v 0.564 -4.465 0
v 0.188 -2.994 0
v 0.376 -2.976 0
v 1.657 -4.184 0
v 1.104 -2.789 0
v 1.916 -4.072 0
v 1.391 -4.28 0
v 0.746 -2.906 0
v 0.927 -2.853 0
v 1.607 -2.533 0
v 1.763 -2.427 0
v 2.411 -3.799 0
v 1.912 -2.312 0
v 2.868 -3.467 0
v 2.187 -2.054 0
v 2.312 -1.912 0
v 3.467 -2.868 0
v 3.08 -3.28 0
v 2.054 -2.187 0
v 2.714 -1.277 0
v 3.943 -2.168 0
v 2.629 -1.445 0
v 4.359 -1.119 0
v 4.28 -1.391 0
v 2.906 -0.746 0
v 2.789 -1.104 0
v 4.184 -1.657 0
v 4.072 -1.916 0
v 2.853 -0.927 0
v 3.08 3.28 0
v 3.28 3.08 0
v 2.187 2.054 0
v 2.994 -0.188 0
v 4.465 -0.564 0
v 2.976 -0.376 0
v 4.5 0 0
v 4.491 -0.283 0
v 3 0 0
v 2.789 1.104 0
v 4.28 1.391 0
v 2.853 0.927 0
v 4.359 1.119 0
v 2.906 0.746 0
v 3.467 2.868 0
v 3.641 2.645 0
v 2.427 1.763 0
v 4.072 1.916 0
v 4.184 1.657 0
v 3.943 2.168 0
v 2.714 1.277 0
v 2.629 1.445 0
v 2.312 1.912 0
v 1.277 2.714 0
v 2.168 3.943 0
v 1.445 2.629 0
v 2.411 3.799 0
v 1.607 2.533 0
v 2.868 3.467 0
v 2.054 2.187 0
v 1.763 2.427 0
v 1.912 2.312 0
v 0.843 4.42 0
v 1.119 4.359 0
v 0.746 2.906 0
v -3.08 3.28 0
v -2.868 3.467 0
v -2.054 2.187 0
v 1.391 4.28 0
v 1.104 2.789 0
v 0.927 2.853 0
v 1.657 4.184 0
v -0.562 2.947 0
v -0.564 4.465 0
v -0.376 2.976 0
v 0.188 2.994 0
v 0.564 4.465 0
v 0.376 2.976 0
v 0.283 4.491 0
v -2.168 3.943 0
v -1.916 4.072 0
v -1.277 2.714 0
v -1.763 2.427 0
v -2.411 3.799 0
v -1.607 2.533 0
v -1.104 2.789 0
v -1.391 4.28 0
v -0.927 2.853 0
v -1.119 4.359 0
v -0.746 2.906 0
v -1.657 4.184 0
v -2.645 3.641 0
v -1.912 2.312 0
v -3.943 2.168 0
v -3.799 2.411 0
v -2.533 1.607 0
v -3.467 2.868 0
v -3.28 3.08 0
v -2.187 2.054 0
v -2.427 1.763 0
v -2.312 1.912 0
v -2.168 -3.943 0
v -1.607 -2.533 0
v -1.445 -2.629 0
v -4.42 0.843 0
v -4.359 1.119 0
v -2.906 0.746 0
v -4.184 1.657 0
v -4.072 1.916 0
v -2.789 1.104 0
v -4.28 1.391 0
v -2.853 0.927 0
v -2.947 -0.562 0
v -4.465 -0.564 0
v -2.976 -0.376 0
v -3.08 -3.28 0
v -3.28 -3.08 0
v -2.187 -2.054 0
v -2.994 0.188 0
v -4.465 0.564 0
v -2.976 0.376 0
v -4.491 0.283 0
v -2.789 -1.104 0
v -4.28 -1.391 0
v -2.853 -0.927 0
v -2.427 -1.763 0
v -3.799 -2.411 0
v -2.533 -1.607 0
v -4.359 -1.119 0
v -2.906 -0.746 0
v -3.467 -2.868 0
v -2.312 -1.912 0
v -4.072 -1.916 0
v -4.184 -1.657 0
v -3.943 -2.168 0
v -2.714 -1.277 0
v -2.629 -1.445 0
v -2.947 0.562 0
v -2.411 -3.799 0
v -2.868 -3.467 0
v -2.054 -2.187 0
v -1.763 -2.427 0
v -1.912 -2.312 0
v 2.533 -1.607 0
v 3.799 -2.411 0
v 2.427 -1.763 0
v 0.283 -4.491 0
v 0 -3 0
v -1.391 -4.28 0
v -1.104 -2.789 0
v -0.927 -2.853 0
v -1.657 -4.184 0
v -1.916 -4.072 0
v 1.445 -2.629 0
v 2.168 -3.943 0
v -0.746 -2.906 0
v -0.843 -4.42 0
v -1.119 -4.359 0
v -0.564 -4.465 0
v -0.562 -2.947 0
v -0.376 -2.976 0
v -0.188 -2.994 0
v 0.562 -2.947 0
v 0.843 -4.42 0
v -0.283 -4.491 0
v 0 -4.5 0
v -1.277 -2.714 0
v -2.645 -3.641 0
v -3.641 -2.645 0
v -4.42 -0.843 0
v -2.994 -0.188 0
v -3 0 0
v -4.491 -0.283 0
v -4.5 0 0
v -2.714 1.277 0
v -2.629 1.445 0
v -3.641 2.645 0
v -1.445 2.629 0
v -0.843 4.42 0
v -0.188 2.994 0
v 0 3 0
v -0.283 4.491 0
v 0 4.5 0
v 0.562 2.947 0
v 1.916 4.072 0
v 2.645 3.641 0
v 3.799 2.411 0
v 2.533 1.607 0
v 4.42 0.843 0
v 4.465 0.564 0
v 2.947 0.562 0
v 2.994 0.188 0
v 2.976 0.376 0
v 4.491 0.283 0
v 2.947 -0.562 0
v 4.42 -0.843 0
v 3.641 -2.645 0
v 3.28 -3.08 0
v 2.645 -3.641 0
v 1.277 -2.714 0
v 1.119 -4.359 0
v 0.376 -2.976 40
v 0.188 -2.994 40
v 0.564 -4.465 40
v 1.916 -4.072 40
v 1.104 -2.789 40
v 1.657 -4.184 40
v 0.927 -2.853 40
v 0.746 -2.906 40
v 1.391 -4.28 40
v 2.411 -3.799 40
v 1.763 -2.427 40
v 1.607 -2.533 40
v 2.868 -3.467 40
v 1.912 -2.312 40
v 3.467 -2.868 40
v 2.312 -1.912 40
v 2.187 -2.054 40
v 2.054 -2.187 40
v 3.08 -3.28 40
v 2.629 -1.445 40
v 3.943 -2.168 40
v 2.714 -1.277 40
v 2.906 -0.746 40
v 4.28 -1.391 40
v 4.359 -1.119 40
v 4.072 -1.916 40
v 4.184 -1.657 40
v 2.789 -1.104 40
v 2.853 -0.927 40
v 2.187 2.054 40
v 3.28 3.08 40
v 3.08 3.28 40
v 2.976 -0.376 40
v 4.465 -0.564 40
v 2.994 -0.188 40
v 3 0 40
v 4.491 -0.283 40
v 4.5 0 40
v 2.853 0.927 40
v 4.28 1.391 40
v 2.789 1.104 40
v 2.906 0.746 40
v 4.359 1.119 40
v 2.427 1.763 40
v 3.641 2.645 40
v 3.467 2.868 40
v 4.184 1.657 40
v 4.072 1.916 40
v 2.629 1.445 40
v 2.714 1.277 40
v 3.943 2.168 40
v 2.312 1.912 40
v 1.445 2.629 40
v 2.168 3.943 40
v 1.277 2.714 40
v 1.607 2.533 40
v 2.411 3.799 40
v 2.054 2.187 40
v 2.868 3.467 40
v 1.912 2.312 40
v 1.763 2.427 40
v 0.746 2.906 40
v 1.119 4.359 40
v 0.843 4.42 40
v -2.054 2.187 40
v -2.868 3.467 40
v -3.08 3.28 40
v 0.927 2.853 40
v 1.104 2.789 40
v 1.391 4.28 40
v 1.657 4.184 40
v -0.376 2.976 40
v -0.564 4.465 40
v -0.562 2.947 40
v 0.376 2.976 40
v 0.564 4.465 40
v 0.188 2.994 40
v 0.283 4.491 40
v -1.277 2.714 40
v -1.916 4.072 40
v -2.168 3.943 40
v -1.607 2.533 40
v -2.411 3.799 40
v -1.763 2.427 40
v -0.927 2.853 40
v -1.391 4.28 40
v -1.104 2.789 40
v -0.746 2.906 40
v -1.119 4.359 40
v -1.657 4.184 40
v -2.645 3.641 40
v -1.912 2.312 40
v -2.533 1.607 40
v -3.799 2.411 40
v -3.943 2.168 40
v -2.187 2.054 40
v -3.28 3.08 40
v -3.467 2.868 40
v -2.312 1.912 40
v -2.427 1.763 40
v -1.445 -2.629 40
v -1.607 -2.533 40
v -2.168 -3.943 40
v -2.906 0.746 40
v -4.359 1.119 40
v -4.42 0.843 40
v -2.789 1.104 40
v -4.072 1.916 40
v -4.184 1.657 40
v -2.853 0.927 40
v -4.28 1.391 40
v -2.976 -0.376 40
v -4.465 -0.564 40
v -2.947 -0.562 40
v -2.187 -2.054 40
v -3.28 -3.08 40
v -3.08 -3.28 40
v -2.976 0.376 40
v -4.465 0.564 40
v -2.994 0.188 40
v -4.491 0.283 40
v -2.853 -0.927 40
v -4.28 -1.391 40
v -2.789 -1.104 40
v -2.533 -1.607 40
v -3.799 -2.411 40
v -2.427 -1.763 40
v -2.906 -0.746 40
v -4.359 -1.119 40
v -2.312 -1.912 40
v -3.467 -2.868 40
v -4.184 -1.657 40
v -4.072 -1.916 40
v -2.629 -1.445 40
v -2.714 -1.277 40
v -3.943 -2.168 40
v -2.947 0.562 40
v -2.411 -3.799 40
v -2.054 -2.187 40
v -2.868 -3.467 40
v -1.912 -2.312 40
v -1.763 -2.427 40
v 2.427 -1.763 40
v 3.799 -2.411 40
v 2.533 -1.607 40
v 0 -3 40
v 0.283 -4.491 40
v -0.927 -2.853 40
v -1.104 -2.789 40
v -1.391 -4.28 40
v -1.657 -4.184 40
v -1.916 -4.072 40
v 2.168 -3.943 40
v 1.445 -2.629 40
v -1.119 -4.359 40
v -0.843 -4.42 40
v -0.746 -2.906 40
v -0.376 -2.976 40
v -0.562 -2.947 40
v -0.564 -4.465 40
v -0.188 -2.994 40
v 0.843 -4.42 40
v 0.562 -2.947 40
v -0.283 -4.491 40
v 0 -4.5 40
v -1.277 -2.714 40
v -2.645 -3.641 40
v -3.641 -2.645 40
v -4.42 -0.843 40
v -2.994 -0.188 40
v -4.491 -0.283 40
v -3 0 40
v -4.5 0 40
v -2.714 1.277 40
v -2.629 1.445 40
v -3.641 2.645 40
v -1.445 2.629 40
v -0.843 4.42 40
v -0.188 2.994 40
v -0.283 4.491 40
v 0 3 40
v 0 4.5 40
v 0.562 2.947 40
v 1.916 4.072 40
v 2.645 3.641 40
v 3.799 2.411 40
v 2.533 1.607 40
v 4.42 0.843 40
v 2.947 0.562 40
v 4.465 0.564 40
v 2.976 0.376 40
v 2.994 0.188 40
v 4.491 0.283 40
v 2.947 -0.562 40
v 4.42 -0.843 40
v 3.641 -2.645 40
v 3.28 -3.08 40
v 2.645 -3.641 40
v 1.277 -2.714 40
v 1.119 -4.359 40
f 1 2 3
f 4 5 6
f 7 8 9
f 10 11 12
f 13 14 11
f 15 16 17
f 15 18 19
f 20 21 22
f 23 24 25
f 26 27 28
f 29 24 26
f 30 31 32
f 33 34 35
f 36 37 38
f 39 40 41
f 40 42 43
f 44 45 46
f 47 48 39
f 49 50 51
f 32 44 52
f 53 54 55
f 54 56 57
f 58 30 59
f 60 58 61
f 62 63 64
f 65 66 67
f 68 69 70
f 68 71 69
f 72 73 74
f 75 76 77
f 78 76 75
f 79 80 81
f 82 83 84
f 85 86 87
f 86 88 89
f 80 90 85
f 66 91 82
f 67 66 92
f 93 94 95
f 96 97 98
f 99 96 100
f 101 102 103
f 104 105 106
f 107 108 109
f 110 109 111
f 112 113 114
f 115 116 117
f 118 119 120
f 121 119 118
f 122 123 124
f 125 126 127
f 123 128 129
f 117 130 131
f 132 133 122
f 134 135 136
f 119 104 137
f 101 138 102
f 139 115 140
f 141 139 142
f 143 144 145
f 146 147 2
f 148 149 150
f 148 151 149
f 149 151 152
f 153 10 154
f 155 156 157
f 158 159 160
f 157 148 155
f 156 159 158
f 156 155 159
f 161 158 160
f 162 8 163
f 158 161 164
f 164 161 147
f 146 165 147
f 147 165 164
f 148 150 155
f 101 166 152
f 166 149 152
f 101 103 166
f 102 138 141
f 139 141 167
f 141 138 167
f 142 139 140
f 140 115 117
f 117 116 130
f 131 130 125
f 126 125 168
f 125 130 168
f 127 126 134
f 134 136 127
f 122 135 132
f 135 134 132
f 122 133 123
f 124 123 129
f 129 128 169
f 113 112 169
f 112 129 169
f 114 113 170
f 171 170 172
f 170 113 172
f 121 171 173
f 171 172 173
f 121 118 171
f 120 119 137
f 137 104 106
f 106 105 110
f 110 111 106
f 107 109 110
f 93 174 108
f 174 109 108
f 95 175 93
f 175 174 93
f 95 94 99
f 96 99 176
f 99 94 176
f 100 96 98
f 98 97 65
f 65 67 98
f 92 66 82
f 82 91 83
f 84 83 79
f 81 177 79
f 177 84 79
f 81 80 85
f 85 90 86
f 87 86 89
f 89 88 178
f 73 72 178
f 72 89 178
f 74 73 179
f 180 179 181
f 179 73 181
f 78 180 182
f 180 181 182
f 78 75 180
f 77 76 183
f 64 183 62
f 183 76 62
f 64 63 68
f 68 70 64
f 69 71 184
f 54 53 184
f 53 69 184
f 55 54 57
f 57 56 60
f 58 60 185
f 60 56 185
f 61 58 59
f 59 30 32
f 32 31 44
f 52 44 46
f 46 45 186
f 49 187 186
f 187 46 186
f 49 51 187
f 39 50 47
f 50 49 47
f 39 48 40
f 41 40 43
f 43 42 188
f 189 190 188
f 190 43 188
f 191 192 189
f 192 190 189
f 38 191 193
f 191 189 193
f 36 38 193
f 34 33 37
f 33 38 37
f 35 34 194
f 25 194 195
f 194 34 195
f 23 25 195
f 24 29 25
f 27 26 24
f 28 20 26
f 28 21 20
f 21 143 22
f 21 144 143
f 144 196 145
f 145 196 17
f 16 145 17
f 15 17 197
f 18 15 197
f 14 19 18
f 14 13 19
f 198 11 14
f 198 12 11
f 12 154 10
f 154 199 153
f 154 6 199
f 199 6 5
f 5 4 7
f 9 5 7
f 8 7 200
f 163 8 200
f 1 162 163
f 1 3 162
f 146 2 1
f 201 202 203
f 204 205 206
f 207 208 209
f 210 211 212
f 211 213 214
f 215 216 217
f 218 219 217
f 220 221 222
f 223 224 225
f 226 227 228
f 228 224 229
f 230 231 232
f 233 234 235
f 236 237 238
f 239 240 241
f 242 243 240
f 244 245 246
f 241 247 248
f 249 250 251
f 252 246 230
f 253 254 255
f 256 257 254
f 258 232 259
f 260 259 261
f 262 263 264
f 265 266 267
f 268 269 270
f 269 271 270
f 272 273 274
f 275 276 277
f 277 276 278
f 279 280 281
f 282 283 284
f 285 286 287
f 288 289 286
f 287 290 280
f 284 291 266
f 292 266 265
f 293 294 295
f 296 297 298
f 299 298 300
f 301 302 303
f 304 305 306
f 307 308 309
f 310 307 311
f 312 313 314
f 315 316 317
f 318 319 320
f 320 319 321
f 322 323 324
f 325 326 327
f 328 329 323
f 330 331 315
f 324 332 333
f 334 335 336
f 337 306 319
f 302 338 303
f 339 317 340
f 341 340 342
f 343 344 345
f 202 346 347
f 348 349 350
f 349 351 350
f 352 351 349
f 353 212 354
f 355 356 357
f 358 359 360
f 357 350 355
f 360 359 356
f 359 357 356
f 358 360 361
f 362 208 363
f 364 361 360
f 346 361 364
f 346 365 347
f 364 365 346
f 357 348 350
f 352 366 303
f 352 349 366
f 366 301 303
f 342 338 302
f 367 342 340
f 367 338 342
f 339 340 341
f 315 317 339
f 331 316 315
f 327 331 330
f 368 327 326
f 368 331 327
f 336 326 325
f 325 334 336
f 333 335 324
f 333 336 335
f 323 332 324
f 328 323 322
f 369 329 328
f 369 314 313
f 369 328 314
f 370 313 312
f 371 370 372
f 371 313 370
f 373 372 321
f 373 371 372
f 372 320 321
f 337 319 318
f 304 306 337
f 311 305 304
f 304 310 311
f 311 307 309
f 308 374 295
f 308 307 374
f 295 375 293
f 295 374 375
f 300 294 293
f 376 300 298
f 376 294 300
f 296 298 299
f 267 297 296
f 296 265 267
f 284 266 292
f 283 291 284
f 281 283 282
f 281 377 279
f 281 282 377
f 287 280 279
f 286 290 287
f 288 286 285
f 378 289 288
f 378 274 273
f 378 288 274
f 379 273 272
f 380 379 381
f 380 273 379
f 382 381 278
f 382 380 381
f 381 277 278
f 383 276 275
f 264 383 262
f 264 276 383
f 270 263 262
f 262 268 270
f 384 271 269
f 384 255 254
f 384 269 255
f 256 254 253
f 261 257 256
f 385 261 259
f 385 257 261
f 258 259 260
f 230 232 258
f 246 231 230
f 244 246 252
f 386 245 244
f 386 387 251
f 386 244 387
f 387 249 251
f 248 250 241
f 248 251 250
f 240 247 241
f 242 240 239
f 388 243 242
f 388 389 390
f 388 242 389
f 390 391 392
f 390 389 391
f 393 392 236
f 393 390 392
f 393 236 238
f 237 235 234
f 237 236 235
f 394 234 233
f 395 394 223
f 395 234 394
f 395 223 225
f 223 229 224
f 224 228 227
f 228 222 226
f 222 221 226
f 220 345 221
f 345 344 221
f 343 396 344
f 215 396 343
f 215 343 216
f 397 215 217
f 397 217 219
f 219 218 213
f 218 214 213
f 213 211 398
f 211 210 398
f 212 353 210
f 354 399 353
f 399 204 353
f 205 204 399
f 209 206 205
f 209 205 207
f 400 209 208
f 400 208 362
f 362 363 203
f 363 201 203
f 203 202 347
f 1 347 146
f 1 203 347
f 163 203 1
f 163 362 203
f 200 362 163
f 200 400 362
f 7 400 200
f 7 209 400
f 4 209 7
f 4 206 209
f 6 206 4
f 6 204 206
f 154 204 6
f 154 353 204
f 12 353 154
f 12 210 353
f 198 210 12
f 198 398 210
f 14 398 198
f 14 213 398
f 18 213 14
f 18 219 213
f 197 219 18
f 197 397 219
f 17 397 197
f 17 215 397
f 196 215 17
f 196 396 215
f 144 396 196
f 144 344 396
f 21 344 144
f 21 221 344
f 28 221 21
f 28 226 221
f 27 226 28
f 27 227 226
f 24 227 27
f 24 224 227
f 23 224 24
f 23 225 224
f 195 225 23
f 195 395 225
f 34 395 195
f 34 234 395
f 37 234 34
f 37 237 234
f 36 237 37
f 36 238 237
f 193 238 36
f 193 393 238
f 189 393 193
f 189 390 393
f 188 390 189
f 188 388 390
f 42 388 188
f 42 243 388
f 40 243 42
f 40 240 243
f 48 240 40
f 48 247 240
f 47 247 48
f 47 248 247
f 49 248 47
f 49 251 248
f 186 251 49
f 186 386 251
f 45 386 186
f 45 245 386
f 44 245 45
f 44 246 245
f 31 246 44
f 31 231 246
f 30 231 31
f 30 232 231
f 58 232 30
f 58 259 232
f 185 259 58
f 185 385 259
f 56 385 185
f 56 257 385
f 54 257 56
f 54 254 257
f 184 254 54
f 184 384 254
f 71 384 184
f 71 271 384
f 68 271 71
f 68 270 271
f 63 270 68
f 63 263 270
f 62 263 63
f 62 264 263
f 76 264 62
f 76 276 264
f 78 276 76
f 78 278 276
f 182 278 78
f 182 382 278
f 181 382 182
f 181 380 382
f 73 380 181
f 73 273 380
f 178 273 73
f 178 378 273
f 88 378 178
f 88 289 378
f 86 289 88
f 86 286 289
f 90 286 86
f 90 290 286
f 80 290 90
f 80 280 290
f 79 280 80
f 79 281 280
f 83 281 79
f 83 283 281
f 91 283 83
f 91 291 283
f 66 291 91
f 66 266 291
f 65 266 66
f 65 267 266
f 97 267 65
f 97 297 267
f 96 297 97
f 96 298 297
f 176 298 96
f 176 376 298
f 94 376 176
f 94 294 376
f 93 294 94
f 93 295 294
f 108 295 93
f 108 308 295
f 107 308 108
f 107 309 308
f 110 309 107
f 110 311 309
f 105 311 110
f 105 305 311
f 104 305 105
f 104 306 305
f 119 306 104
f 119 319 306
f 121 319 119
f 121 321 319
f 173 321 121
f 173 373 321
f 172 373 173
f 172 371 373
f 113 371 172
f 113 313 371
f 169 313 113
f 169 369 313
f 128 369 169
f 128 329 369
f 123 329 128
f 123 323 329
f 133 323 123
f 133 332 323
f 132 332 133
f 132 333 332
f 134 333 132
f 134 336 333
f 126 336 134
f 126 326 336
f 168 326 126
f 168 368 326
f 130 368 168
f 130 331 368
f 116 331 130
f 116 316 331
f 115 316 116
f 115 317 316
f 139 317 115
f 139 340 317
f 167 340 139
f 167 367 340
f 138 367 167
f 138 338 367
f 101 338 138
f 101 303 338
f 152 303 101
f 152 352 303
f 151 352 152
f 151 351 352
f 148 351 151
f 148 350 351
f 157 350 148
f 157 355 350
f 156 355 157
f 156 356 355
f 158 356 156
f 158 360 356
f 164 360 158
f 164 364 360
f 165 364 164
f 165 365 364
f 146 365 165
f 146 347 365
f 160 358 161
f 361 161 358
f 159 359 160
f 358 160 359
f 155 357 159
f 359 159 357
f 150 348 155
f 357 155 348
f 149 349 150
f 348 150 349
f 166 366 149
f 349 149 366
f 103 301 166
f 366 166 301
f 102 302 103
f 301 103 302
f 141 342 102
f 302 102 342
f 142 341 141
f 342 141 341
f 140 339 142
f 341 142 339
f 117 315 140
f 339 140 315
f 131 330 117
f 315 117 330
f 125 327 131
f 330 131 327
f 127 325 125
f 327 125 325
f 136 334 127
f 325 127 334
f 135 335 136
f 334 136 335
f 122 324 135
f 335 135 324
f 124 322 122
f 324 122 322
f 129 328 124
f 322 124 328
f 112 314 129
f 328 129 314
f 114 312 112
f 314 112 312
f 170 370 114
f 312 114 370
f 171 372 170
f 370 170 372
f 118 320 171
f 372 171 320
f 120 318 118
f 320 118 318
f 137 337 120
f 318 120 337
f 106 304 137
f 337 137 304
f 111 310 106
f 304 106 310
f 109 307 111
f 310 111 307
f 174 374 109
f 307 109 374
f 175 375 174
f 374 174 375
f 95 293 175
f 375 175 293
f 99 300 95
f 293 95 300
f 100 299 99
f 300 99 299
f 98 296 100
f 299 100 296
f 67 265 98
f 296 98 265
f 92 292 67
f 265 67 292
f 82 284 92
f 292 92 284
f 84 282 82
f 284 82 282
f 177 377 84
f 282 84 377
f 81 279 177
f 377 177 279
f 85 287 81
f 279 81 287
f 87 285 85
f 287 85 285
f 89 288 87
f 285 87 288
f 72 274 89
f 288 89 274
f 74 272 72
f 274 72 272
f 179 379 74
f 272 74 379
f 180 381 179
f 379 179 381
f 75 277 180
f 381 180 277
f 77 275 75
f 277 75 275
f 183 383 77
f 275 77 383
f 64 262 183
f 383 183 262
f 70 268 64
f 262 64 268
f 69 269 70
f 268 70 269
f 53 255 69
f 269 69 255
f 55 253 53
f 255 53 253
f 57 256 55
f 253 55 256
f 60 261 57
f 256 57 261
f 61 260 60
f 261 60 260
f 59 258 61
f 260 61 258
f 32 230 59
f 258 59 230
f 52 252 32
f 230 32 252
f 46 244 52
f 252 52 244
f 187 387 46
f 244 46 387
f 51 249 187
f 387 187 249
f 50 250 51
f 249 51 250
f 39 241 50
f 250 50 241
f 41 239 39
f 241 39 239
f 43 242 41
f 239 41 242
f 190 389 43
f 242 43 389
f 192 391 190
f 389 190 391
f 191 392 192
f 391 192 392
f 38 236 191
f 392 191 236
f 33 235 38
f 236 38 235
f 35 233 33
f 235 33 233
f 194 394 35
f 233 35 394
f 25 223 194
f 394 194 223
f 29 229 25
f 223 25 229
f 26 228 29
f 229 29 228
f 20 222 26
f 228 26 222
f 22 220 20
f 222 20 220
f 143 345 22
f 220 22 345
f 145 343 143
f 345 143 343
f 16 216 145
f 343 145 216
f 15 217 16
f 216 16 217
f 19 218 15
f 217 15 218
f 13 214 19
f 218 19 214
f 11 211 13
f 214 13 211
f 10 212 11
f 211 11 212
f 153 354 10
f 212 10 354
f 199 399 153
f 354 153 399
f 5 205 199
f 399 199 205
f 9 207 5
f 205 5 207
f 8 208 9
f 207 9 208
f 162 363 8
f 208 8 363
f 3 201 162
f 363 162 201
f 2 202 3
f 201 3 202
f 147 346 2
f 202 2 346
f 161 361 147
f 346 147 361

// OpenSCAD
$fn=100;

linear_extrude(40) {
    difference() {
        circle(r=4.5);
        circle(r=3);
    }
}
